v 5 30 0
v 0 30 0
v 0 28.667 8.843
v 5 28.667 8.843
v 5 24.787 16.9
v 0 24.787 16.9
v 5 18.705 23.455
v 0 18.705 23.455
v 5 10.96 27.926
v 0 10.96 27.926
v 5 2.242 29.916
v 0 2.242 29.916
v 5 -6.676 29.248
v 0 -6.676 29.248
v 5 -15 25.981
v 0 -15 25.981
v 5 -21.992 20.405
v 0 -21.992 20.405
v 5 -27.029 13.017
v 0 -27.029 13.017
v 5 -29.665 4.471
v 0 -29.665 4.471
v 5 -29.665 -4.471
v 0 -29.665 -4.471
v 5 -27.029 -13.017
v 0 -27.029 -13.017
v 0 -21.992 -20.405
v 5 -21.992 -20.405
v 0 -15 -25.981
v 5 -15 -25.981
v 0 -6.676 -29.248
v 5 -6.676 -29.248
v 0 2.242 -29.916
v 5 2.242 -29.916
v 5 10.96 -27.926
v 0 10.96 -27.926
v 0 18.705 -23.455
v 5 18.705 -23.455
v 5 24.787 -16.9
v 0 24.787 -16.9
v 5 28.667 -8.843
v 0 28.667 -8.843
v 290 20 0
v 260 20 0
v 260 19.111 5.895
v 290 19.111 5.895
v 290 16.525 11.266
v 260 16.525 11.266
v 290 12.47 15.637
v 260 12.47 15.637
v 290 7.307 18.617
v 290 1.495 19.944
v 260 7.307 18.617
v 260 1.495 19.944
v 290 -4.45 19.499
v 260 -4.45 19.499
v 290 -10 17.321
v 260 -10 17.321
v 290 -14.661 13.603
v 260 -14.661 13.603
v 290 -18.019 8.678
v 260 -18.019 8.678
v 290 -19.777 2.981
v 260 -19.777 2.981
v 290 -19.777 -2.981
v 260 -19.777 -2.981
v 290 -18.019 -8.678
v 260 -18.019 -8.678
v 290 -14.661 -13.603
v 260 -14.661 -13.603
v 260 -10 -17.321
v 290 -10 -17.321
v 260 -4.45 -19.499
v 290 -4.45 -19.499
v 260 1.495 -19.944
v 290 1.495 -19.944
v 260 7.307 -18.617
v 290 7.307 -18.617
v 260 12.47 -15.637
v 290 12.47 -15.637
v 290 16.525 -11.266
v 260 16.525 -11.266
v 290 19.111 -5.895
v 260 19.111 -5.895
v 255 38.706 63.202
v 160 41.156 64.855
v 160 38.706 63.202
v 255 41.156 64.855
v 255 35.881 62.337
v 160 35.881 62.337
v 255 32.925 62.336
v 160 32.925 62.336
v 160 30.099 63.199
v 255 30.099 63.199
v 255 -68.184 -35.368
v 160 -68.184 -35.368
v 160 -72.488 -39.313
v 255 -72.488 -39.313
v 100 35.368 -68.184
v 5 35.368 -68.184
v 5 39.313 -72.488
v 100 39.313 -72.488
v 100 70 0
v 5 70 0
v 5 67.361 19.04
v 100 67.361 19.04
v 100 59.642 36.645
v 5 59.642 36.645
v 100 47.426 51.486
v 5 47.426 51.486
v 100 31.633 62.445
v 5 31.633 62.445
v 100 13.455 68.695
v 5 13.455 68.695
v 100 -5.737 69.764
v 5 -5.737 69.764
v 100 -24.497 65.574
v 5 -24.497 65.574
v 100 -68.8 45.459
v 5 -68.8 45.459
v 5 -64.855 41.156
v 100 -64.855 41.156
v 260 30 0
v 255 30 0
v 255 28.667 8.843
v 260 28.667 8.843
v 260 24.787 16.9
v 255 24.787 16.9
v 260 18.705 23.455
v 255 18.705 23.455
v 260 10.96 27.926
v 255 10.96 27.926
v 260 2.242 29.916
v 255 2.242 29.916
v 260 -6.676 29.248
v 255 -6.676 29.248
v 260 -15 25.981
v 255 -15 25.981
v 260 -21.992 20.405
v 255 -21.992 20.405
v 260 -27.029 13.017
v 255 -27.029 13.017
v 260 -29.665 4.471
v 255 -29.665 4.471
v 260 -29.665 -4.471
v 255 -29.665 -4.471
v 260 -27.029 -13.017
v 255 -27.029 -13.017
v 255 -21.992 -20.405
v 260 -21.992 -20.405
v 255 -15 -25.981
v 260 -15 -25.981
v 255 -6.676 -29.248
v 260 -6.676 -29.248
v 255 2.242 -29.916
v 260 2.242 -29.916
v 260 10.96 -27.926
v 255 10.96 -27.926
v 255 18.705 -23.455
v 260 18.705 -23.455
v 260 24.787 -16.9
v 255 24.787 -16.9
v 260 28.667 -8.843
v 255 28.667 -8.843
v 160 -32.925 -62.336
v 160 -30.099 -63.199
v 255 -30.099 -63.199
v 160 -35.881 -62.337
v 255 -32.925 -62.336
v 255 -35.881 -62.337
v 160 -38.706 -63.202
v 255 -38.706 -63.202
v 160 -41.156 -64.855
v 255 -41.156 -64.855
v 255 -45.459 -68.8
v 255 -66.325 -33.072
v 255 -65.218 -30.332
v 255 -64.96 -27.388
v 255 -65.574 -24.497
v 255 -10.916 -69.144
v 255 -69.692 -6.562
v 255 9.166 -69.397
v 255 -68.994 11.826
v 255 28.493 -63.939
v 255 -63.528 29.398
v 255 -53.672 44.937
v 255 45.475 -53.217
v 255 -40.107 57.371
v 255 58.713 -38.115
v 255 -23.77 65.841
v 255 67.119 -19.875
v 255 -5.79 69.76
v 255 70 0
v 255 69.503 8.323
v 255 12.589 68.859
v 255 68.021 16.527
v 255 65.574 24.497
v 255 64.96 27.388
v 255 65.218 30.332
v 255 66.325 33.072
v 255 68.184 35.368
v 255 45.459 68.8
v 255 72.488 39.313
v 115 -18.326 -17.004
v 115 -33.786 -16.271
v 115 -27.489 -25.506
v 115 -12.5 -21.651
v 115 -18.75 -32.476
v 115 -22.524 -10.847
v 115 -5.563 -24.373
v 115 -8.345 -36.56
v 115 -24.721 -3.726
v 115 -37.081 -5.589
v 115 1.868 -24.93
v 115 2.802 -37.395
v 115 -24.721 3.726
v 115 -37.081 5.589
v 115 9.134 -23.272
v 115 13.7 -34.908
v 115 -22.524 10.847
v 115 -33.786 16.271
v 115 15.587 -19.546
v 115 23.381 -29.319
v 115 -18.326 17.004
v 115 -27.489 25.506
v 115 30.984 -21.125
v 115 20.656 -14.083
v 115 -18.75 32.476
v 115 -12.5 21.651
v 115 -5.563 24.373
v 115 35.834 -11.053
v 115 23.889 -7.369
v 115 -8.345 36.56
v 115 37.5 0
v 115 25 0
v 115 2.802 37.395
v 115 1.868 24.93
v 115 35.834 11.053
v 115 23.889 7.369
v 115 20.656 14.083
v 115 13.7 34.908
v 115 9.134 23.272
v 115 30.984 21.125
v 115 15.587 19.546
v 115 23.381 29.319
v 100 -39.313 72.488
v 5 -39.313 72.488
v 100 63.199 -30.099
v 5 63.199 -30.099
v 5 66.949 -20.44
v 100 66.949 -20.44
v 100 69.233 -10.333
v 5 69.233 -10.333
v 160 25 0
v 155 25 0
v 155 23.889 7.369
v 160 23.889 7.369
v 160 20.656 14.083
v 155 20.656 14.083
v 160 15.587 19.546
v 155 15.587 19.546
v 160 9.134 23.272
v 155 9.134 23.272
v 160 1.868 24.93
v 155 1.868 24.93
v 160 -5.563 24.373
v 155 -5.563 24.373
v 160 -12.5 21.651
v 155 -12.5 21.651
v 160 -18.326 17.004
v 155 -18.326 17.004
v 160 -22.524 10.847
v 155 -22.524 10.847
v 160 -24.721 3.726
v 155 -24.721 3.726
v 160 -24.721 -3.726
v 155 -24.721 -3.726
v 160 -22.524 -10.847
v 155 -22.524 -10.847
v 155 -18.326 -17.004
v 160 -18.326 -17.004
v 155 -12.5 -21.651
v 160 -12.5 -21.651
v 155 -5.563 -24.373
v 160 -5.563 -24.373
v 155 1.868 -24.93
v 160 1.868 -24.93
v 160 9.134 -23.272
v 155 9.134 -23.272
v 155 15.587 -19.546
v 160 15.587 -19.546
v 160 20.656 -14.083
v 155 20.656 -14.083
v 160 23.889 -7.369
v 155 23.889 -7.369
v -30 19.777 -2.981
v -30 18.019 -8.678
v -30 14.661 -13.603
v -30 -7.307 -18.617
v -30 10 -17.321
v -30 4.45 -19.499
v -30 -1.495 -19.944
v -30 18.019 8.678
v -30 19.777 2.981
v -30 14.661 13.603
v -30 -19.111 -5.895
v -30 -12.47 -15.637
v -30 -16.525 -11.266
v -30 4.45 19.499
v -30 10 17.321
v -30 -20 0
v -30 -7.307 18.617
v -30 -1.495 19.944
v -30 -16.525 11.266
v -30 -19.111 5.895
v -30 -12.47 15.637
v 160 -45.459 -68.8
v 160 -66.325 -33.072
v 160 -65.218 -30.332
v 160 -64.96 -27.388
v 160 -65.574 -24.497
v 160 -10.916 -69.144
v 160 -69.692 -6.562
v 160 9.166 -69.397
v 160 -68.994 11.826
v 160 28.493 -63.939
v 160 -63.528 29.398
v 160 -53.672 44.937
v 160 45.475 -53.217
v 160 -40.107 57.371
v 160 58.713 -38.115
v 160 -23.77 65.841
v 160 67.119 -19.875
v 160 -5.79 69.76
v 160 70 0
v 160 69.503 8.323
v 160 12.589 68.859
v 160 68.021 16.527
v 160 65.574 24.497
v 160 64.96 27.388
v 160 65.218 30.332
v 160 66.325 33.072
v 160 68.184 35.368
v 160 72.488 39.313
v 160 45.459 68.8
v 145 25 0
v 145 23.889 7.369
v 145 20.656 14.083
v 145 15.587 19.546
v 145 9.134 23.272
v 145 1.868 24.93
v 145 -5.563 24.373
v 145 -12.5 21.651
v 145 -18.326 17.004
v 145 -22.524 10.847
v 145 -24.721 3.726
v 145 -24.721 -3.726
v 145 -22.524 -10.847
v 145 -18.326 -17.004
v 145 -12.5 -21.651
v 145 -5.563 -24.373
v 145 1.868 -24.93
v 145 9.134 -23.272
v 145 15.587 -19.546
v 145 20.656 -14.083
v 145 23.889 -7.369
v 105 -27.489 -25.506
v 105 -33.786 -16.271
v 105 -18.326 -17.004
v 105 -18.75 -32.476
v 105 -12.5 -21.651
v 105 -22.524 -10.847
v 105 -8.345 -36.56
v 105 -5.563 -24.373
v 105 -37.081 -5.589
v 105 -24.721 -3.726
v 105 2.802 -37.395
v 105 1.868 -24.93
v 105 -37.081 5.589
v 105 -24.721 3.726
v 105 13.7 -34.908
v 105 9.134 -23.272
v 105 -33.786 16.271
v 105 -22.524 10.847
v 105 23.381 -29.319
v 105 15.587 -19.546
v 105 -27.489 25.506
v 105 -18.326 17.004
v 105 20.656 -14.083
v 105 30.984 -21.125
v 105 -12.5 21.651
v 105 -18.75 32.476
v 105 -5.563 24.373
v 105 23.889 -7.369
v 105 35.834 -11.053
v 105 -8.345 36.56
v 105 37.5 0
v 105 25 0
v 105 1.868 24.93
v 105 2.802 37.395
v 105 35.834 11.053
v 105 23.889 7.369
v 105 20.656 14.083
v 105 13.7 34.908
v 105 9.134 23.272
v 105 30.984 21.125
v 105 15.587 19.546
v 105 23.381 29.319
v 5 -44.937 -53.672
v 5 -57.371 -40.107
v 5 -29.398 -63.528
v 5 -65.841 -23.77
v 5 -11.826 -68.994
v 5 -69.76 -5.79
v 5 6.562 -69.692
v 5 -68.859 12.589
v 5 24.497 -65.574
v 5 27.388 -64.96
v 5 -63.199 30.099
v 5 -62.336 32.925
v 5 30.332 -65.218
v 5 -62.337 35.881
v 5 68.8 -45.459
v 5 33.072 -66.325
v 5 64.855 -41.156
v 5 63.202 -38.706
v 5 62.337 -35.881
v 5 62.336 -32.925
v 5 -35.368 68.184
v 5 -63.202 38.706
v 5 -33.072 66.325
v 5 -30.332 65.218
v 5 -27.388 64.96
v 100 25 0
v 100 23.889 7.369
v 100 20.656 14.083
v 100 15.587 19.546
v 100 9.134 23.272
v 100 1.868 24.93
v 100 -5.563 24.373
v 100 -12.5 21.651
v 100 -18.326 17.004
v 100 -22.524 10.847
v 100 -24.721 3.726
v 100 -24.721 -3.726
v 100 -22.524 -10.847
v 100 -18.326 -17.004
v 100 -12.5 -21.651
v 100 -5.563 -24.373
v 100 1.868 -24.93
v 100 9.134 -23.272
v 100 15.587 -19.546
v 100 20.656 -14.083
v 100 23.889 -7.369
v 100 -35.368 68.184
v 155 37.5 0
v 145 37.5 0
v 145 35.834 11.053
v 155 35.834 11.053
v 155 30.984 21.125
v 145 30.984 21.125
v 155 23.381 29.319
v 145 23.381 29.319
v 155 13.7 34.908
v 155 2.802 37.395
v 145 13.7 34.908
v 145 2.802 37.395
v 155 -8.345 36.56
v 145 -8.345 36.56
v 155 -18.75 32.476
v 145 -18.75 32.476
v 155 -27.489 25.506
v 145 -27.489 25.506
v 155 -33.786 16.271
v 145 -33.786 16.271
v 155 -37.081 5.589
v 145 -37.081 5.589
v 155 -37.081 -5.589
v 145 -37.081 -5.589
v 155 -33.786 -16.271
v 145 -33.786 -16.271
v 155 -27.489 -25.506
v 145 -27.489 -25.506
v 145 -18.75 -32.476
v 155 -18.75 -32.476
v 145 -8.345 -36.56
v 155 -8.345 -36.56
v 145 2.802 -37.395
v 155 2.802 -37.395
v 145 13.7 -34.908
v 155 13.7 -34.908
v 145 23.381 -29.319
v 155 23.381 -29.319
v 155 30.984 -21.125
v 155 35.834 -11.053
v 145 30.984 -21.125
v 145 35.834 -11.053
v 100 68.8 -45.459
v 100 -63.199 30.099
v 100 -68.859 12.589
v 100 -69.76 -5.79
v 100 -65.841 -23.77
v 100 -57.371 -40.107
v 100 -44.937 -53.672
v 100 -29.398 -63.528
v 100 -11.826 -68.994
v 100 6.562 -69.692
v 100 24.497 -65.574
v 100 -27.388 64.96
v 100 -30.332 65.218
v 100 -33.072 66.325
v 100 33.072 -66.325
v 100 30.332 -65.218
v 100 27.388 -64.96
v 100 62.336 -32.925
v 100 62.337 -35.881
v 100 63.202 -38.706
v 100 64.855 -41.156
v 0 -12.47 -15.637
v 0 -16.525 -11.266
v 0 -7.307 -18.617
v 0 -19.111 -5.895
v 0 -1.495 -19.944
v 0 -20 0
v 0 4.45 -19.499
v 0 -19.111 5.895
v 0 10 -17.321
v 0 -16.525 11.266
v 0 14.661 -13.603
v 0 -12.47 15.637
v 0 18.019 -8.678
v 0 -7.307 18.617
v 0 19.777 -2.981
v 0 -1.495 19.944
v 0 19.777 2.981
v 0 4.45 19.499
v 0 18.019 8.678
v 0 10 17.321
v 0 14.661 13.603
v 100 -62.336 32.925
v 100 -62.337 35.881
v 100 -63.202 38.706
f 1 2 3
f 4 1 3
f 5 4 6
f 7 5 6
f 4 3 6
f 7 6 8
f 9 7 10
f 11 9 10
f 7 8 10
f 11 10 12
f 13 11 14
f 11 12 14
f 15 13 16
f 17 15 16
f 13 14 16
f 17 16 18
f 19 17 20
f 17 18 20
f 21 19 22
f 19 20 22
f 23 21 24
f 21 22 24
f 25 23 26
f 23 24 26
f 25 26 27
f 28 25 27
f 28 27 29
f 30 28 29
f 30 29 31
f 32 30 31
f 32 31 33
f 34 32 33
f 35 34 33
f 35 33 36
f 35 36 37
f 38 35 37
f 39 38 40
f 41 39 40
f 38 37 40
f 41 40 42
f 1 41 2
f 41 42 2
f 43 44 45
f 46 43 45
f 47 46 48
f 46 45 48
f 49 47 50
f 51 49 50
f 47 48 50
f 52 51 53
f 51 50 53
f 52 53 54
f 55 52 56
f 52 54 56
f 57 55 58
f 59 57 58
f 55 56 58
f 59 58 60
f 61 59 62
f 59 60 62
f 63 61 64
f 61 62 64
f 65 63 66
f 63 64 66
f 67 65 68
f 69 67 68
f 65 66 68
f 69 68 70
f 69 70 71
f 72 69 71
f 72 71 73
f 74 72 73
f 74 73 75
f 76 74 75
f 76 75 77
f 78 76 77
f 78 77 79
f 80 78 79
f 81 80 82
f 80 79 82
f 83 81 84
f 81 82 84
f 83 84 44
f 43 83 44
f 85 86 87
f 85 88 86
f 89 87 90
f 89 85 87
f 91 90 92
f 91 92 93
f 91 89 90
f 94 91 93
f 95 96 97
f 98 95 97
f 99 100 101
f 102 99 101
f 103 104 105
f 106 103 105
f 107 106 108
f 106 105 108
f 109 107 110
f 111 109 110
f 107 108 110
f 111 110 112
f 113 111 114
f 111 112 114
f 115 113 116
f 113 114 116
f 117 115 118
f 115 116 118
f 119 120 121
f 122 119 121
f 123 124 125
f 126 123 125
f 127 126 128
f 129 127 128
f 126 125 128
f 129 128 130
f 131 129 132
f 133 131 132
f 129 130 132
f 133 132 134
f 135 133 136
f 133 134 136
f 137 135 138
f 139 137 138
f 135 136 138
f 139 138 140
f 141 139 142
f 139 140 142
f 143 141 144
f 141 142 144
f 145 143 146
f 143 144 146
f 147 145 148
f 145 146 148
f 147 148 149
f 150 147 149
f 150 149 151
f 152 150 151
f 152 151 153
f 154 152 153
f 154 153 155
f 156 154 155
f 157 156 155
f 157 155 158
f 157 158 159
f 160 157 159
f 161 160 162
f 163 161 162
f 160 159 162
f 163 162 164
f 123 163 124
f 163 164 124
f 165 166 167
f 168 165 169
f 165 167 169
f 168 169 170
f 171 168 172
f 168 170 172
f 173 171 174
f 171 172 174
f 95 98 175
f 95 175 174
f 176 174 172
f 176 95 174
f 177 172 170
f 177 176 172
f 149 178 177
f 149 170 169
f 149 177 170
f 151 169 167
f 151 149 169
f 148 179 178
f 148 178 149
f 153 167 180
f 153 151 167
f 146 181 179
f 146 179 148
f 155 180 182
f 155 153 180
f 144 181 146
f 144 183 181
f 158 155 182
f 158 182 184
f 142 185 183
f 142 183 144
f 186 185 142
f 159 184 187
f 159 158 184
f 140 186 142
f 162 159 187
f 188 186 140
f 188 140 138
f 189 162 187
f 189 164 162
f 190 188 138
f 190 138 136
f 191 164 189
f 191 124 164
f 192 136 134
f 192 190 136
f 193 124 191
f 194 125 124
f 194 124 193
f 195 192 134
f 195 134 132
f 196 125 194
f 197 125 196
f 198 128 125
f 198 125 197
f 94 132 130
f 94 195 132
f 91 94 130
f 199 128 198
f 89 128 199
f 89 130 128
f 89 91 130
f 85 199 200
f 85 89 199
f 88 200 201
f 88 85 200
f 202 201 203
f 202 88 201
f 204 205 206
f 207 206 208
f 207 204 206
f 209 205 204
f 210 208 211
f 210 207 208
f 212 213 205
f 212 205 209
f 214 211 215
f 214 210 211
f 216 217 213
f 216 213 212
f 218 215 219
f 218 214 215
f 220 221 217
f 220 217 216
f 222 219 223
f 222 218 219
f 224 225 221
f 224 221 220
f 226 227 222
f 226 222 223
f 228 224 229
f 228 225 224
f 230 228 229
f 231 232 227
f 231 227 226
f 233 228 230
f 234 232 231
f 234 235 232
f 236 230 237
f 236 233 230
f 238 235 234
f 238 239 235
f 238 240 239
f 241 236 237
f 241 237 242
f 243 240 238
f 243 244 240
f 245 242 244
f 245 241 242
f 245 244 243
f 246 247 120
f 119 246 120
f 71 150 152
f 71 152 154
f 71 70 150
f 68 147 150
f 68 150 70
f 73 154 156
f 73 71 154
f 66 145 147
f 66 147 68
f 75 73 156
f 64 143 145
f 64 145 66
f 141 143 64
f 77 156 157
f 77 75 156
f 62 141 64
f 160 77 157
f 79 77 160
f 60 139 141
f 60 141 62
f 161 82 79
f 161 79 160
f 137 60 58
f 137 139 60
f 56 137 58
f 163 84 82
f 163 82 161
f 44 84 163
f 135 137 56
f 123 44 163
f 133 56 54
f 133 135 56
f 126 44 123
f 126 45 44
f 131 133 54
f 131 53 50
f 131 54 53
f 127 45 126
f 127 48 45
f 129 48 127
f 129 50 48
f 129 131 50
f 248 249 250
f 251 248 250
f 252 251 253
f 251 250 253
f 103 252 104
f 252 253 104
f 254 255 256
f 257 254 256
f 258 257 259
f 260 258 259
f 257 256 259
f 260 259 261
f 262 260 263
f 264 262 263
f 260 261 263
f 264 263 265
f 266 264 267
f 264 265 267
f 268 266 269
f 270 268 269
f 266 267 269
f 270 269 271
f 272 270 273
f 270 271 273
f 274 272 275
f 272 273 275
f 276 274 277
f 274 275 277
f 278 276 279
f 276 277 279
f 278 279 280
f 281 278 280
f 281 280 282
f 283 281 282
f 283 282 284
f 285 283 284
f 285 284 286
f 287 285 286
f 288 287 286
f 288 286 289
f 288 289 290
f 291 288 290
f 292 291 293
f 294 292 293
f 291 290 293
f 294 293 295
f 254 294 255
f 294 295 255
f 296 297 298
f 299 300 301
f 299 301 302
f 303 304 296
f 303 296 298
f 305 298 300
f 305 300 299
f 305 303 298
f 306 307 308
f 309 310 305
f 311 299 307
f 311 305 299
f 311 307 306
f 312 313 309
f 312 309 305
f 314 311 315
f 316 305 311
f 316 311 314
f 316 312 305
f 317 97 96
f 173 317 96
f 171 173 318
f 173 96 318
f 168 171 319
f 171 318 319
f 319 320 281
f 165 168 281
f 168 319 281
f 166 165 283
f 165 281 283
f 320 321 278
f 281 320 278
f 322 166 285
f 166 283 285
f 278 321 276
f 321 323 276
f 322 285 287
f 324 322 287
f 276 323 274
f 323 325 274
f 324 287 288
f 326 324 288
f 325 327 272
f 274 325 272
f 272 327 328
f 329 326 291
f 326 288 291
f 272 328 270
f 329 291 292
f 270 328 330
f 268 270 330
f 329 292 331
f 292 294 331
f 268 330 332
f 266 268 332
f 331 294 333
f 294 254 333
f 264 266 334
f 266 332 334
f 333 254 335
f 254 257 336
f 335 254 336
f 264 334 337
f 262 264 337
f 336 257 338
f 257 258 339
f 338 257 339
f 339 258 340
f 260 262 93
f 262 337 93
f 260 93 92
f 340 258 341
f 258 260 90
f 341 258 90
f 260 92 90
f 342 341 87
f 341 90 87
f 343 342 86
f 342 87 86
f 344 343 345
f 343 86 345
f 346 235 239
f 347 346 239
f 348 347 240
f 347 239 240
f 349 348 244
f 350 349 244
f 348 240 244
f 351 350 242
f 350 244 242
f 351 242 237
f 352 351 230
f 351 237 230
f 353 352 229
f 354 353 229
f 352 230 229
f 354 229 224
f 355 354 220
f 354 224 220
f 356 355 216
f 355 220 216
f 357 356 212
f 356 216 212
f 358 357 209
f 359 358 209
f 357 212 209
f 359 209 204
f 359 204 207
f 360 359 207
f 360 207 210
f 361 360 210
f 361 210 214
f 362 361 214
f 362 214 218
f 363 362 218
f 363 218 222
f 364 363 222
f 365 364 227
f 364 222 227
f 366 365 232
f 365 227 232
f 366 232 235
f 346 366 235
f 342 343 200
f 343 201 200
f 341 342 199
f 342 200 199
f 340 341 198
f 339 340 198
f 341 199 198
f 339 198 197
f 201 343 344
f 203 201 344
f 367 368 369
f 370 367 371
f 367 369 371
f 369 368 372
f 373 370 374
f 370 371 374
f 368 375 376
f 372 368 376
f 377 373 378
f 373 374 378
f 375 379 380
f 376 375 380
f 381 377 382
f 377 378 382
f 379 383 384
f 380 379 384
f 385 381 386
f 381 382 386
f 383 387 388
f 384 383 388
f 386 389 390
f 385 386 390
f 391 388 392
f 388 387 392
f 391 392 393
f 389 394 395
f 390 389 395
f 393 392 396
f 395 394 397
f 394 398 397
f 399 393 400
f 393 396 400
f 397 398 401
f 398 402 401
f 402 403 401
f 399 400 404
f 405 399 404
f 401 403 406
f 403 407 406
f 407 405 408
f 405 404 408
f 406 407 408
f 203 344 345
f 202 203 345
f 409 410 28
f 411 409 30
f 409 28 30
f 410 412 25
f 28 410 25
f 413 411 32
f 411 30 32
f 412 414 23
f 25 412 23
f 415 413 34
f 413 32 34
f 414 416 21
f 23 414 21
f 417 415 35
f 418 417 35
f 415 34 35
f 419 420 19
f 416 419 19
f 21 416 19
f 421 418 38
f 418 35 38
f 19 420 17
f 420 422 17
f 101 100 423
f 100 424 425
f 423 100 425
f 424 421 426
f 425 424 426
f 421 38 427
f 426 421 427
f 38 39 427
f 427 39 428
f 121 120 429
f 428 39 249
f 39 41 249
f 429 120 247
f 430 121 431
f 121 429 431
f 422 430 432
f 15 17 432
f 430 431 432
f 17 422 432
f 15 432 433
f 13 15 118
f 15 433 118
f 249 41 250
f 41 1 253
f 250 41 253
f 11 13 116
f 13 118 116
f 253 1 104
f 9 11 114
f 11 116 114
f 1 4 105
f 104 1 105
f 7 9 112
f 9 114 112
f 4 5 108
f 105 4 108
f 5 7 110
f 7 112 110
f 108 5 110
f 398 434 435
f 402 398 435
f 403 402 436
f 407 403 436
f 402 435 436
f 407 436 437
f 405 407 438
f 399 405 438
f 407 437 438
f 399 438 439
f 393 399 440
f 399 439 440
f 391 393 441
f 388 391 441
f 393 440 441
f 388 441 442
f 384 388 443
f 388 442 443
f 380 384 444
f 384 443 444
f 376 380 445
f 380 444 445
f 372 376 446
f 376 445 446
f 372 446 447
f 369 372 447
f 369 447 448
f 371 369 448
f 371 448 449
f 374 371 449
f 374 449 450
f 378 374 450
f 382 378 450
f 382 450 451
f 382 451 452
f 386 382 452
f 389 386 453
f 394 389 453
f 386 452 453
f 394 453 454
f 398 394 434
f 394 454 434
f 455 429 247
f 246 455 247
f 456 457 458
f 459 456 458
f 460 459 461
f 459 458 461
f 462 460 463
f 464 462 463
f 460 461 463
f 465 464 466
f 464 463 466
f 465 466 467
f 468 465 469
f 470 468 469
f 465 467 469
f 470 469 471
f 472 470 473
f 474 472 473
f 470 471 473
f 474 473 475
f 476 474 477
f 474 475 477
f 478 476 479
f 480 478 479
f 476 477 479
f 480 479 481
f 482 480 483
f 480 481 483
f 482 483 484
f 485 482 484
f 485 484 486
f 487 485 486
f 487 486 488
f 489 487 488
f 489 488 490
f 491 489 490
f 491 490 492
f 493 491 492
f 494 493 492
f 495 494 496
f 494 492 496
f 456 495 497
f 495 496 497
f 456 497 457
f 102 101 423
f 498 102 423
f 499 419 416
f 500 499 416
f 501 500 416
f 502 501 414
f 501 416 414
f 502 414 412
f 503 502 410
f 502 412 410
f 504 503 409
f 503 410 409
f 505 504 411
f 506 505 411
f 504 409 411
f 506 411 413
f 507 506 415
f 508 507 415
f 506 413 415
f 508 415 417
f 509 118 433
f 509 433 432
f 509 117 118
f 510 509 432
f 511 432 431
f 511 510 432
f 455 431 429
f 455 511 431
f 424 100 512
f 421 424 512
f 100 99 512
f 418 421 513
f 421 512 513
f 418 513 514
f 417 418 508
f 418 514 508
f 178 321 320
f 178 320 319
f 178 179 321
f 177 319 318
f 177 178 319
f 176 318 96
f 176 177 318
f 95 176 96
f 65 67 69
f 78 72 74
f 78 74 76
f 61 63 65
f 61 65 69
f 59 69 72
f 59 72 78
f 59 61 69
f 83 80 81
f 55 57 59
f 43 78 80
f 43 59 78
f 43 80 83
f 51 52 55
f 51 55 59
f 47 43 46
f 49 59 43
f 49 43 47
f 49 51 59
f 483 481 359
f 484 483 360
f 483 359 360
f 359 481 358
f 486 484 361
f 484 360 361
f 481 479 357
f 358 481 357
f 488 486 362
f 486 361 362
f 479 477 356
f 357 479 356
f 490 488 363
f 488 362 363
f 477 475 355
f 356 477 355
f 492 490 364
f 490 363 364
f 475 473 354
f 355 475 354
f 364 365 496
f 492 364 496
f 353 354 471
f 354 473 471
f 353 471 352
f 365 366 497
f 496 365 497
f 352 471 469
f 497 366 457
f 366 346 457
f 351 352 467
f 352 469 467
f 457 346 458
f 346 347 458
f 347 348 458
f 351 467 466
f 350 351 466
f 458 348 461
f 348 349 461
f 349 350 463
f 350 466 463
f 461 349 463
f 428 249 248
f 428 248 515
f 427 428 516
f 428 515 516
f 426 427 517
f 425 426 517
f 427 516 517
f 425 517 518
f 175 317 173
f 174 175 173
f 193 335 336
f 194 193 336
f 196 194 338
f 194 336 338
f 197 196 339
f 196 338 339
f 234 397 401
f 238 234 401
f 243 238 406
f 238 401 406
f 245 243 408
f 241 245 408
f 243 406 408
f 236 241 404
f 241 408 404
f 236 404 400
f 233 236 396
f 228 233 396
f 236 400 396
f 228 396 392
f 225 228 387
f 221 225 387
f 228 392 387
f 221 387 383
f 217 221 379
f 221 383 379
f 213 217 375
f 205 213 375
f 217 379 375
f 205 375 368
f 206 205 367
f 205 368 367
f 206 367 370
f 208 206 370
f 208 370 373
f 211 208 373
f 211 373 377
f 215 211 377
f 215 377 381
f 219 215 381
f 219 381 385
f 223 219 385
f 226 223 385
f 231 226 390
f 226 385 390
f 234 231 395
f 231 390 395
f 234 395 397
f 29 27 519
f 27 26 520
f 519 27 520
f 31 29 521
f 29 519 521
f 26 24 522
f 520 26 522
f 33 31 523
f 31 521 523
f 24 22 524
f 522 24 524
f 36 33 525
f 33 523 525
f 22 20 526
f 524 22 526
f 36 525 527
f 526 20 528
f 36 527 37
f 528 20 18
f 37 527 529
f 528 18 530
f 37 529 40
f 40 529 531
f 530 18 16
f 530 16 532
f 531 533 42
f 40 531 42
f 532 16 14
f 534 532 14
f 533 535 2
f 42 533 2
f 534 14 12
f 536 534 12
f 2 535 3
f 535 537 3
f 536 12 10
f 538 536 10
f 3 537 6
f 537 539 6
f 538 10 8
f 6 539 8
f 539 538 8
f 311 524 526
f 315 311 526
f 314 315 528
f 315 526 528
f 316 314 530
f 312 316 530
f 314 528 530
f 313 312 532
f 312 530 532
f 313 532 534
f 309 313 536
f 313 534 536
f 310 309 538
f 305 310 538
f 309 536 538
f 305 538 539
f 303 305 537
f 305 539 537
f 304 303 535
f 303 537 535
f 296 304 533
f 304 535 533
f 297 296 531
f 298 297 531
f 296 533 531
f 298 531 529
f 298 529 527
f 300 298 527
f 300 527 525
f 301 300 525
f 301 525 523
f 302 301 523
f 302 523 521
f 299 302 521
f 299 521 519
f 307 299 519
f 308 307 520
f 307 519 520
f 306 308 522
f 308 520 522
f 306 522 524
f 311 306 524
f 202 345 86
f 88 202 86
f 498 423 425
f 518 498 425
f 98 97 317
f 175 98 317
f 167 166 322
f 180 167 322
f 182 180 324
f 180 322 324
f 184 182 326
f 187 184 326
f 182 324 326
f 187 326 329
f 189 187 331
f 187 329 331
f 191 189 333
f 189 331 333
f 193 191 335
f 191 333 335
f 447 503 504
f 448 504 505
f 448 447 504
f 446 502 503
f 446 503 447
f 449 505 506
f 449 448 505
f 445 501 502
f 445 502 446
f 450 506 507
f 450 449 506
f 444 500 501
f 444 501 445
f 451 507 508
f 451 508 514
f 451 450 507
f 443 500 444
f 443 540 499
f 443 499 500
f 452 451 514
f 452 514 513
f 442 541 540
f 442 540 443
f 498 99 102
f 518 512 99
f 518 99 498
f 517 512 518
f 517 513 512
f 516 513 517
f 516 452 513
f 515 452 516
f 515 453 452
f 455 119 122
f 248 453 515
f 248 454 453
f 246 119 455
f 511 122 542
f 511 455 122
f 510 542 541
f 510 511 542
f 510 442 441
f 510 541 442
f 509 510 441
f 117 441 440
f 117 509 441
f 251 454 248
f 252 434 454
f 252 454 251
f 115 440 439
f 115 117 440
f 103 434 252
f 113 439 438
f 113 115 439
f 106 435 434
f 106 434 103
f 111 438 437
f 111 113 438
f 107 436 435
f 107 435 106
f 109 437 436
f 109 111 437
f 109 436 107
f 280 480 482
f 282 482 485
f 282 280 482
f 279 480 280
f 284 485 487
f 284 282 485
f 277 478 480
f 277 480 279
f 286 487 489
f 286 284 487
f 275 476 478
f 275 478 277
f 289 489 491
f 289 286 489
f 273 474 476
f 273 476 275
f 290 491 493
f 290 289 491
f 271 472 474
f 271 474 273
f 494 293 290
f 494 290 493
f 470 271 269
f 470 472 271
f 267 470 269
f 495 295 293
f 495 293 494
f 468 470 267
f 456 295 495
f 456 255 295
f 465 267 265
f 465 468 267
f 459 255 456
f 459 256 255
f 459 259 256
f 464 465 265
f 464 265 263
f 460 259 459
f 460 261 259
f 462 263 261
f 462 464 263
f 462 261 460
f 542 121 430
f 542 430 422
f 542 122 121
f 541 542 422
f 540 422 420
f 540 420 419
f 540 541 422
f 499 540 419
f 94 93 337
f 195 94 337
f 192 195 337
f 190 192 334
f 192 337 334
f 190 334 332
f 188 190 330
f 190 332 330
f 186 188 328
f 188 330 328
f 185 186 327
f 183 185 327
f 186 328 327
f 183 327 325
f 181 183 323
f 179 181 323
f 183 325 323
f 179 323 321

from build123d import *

# Parameters (mm, degrees)
F0_R      = 30
F1_DEPTH  = 5
F3_DEPTH  = 95
F4_R      = 25
F5_DEPTH  = 5
F6_R      = 37.5
F6_R_2    = 25
F7_DEPTH  = 10
F8_R      = 25
F9_DEPTH  = 30
F10_R     = 37.5
F11_DEPTH = 10
F12_R     = 25
F13_DEPTH = 5
F15_DEPTH = 95
F16_R     = 30
F17_DEPTH = 5
F18_R     = 20
F19_DEPTH = 30
F20_R     = 20
F21_DEPTH = 30
F22_R     = 10


with BuildPart() as f1:
    # F0 (on Right) → F1 (new body)
    with BuildSketch(Plane.YZ):
        Circle(F0_R)
    extrude(amount=F1_DEPTH)

    # F2 (on face) → F3 (join)
    with BuildSketch(Plane.YZ.offset(5)):
        with BuildLine():
            ThreePointArc((60.0712170477, -35.9367344428), (67.4721616422, -18.6415504541), (70, 0))
            ThreePointArc((70, 0), (37.1422350498, 59.333417022), (-30.5844107288, 62.9650206096))
            Line((-30.5844107288, 62.9650206096), (60.0712170477, -35.9367344428))
        make_face()
        with BuildLine():
            Line((60.0712170477, -35.9367344428), (-30.5844107288, 62.9650206096))
            ThreePointArc((-30.5844107288, 62.9650206096), (-47.2995007919, 51.601911058), (-60.0712170477, 35.9367344428))
            Line((-60.0712170477, 35.9367344428), (30.5844107288, -62.9650206096))
            ThreePointArc((30.5844107288, -62.9650206096), (47.2995007919, -51.601911058), (60.0712170477, -35.9367344428))
        make_face()
        with BuildLine():
            ThreePointArc((-60.0712170477, 35.9367344428), (-47.2995007919, 51.601911058), (-30.5844107288, 62.9650206096))
            Line((-30.5844107288, 62.9650206096), (-39.3131691742, 72.4877557211))
            Line((-39.3131691742, 72.4877557211), (-68.7999754931, 45.4594695543))
            Line((-68.7999754931, 45.4594695543), (-60.0712170477, 35.9367344428))
        make_face()
        with BuildLine():
            Line((68.7999754931, -45.4594695543), (60.0712170477, -35.9367344428))
            ThreePointArc((60.0712170477, -35.9367344428), (47.2995007919, -51.601911058), (30.5844107288, -62.9650206096))
            Line((30.5844107288, -62.9650206096), (39.3131691742, -72.4877557211))
            Line((39.3131691742, -72.4877557211), (68.7999754931, -45.4594695543))
        make_face()
        with BuildLine():
            Line((30.5844107288, -62.9650206096), (-60.0712170477, 35.9367344428))
            ThreePointArc((-60.0712170477, 35.9367344428), (-51.601911058, -47.2995007919), (30.5844107288, -62.9650206096))
        make_face()
    extrude(amount=F3_DEPTH)

    # F4 (on face) → F5 (join)
    with BuildSketch(Plane.YZ.offset(100)):
        Circle(F4_R)
    extrude(amount=F5_DEPTH)

    # F6 (on face) → F7 (join)
    with BuildSketch(Plane.YZ.offset(105)):
        Circle(F6_R)
        Circle(F6_R_2, mode=Mode.SUBTRACT)
        Circle(F6_R_2)
    extrude(amount=F7_DEPTH)

    # F8 (on face) → F9 (join)
    with BuildSketch(Plane.YZ.offset(115)):
        Circle(F8_R)
    extrude(amount=F9_DEPTH)

    # F10 (on face) → F11 (join)
    with BuildSketch(Plane.YZ.offset(145)):
        Circle(F10_R)
    extrude(amount=F11_DEPTH)

    # F12 (on face) → F13 (join)
    with BuildSketch(Plane.YZ.offset(155)):
        Circle(F12_R)
    extrude(amount=F13_DEPTH)

    # F14 (on face) → F15 (join)
    with BuildSketch(Plane.YZ.offset(160)):
        with BuildLine():
            Line((72.4877557211, 39.3131691742), (45.4594695543, 68.7999754931))
            Line((45.4594695543, 68.7999754931), (35.9367344428, 60.0712170477))
            ThreePointArc((35.9367344428, 60.0712170477), (51.601911058, 47.2995007919), (62.9650206096, 30.5844107288))
            Line((62.9650206096, 30.5844107288), (72.4877557211, 39.3131691742))
        make_face()
        with BuildLine():
            ThreePointArc((62.9650206096, 30.5844107288), (51.601911058, 47.2995007919), (35.9367344428, 60.0712170477))
            Line((35.9367344428, 60.0712170477), (-62.9650206096, -30.5844107288))
            ThreePointArc((-62.9650206096, -30.5844107288), (-51.601911058, -47.2995007919), (-35.9367344428, -60.0712170477))
            Line((-35.9367344428, -60.0712170477), (62.9650206096, 30.5844107288))
        make_face()
        with BuildLine():
            Line((-62.9650206096, -30.5844107288), (35.9367344428, 60.0712170477))
            ThreePointArc((35.9367344428, 60.0712170477), (-47.2995007919, 51.601911058), (-62.9650206096, -30.5844107288))
        make_face()
        with BuildLine():
            ThreePointArc((70, 0), (68.2185877993, 15.6915352551), (62.9650206096, 30.5844107288))
            Line((62.9650206096, 30.5844107288), (-35.9367344428, -60.0712170477))
            ThreePointArc((-35.9367344428, -60.0712170477), (34.5284563006, -60.8915897764), (70, 0))
        make_face()
        with BuildLine():
            ThreePointArc((-35.9367344428, -60.0712170477), (-51.601911058, -47.2995007919), (-62.9650206096, -30.5844107288))
            Line((-62.9650206096, -30.5844107288), (-72.4877557211, -39.3131691742))
            Line((-72.4877557211, -39.3131691742), (-45.4594695543, -68.7999754931))
            Line((-45.4594695543, -68.7999754931), (-35.9367344428, -60.0712170477))
        make_face()
    extrude(amount=F15_DEPTH)

    # F16 (on face) → F17 (join)
    with BuildSketch(Plane.YZ.offset(255)):
        Circle(F16_R)
    extrude(amount=F17_DEPTH)

    # F18 (on face) → F19 (join)
    with BuildSketch(Plane(origin=(0, 0, 0), x_dir=(0, -1, 0), z_dir=(-1, 0, 0))):
        Circle(F18_R)
    extrude(amount=F19_DEPTH)

    # F20 (on face) → F21 (join)
    with BuildSketch(Plane.YZ.offset(260)):
        Circle(F20_R)
    extrude(amount=F21_DEPTH)

    # F22
    f22_edges = [f1.edges().sort_by_distance(p)[0] for p in [
        (52.5, -60.071217, 35.936734),
        (207.5, -62.965021, -30.584411),
        (52.5, -30.584411, 62.965021),
        (207.5, 35.936734, 60.071217),
        (207.5, 62.965021, 30.584411),
        (52.5, 60.071217, -35.936734),
        (52.5, 30.584411, -62.965021),
        (207.5, -35.936734, -60.071217),
    ]]
    fillet(f22_edges, radius=F22_R)


solid = f1.part
